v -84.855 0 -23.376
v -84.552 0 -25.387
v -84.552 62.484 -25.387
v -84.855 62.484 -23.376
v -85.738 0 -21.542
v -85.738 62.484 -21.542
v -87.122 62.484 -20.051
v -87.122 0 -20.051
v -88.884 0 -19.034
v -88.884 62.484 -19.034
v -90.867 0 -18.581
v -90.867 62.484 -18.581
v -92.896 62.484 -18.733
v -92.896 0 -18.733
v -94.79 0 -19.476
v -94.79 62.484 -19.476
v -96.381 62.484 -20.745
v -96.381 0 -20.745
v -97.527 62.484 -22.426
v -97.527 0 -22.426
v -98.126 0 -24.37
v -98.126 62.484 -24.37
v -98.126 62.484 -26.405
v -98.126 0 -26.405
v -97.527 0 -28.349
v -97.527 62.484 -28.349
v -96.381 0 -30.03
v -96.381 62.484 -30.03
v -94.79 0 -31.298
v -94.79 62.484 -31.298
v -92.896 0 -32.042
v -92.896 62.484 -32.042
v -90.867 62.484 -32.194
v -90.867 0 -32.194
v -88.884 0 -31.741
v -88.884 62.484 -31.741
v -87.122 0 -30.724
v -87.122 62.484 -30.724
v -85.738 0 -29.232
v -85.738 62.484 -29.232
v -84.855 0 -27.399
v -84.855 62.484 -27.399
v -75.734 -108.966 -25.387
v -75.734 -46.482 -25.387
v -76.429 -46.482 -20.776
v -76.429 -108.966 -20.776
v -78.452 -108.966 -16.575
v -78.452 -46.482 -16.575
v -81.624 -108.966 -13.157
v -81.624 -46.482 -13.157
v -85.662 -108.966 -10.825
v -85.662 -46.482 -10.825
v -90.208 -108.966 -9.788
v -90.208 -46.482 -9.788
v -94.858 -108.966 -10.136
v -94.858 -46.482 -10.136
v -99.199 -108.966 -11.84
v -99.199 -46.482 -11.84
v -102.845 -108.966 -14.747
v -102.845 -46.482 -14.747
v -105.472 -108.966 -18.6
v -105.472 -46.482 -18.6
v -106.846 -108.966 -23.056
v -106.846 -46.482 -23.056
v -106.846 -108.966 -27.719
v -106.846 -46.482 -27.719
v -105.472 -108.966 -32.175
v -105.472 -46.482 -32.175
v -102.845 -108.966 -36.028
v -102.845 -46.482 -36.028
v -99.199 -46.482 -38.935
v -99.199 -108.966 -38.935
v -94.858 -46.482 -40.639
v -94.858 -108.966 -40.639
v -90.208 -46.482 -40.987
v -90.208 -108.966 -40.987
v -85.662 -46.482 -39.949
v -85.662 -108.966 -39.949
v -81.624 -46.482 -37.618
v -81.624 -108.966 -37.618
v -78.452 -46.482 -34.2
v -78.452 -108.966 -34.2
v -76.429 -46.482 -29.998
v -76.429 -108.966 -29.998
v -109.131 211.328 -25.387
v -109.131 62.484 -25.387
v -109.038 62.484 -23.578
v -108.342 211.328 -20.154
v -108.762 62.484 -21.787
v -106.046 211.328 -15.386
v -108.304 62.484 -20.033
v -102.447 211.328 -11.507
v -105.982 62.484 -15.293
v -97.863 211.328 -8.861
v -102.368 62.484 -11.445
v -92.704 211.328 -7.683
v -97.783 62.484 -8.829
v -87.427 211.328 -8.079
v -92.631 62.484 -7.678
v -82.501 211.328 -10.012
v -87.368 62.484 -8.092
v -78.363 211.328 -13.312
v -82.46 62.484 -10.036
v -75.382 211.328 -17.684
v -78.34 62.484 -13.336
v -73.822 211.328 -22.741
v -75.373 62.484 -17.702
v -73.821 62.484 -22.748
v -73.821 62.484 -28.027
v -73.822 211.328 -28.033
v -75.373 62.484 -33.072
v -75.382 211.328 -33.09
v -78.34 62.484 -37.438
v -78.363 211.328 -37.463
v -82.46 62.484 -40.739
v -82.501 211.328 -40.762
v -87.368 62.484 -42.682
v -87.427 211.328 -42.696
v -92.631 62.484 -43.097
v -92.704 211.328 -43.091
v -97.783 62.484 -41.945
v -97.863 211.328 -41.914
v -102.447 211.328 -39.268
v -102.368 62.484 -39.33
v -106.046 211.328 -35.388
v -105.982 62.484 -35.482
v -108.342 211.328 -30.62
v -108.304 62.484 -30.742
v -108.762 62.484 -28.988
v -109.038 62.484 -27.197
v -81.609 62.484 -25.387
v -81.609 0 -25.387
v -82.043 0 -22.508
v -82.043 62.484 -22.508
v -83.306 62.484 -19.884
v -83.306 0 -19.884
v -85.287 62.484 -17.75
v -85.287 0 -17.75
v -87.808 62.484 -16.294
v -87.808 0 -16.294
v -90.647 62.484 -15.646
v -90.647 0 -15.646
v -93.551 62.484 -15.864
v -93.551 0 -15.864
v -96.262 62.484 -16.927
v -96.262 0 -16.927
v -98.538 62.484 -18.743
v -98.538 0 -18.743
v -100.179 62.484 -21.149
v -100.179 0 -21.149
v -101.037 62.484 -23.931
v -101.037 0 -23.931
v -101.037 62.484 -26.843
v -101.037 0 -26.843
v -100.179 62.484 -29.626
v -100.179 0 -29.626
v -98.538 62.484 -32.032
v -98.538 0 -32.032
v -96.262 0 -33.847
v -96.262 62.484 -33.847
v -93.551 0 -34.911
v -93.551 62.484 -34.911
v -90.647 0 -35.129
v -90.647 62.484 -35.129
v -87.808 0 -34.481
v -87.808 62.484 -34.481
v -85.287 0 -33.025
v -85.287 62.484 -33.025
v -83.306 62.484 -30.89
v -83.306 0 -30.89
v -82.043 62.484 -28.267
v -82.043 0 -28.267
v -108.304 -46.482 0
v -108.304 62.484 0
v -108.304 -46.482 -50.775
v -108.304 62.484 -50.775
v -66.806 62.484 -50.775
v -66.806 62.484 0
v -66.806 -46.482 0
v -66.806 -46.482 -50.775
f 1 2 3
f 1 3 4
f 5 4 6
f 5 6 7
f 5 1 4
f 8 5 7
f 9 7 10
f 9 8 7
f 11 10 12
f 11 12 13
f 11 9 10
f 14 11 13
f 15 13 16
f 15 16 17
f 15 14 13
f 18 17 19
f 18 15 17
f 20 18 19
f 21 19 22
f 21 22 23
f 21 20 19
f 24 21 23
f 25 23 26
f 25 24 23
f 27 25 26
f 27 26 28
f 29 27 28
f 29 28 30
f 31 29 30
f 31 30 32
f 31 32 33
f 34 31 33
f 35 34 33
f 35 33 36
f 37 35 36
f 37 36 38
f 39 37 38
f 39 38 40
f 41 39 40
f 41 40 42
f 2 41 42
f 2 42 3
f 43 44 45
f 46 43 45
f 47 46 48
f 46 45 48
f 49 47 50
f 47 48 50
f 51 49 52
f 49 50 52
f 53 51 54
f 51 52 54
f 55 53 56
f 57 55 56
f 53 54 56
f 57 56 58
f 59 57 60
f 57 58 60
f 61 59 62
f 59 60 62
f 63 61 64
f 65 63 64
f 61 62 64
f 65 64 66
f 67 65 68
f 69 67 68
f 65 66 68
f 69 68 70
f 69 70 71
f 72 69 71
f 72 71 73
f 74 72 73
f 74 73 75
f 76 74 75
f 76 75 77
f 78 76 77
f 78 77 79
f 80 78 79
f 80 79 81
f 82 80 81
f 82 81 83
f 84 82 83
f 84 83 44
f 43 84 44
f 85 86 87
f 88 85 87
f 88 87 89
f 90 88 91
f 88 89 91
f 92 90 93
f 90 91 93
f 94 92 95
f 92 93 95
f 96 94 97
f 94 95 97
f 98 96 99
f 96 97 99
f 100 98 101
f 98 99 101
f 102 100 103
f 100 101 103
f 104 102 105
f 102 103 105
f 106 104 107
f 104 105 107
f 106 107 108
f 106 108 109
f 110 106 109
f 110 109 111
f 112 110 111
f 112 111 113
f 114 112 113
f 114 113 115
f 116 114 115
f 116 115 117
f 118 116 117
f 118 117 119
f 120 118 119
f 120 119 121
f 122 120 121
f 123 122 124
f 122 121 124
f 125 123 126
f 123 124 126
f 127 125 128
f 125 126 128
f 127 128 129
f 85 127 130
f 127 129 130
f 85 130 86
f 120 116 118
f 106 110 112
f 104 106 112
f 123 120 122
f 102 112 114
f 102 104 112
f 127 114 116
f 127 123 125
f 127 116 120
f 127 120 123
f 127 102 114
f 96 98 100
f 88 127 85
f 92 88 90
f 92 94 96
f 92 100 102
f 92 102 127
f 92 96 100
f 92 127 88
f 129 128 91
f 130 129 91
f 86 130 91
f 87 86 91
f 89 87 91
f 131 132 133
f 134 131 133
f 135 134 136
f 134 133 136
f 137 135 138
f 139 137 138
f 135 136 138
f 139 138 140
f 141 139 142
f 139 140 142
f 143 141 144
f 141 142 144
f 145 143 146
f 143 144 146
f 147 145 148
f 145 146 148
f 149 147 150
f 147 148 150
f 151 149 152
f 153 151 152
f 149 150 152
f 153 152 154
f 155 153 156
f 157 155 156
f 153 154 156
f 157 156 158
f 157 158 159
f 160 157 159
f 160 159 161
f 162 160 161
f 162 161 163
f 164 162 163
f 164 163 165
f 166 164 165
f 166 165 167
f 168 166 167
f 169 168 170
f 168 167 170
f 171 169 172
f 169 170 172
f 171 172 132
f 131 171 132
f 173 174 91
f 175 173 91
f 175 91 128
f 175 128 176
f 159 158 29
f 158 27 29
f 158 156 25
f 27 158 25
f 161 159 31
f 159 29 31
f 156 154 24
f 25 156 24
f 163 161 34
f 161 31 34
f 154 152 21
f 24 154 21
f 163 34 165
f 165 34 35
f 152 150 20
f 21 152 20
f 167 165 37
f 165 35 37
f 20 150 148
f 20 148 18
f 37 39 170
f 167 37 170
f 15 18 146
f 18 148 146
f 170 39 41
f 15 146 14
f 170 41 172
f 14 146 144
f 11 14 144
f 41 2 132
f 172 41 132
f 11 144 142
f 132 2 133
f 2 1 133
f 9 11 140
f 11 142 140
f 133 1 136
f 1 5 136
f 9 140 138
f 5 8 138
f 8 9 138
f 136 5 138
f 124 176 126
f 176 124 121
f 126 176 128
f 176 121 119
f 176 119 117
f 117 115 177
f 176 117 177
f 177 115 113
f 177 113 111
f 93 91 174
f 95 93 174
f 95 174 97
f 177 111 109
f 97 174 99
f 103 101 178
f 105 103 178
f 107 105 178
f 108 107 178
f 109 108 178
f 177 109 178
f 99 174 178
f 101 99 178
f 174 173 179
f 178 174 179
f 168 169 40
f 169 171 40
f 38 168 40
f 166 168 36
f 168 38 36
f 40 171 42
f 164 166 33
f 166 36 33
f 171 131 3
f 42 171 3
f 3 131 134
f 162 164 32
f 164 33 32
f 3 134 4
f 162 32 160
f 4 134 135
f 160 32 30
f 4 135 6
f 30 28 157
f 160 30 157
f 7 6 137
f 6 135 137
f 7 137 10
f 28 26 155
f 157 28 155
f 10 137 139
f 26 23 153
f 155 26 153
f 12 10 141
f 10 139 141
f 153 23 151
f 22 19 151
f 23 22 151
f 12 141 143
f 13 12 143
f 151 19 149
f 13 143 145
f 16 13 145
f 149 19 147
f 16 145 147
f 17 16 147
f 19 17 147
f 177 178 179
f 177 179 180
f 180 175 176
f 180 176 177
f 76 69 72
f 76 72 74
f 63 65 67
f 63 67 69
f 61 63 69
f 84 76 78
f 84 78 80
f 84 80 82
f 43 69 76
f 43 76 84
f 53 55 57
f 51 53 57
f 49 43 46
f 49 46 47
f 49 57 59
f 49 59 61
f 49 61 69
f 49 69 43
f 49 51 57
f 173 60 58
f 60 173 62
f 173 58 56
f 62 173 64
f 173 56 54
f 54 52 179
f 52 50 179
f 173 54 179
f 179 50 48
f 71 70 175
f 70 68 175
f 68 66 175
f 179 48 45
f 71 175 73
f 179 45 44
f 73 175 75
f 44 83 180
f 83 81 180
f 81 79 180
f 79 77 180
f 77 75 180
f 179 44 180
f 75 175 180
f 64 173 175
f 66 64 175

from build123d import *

# Parameters (mm, degrees)
F0_W       = 41.4983332157
F0_H       = 50.7746972144
F0_R       = 9.7686704189
F1_DEPTH   = 62.484
F2_R       = 15.6433873562
F1_FACE1_W = 41.4983332157
F1_FACE1_H = 50.7746972144
F1_FACE1_R = 9.7686704189
F3_DEPTH   = 108.966
F4_R       = 17.7535536274
F5_DEPTH   = 148.844
F6_R       = 6.8253458282
F7_DEPTH   = 248.92


with BuildPart() as f1:
    # F0 (on Front) → F1 (new body)
    with BuildSketch(Plane.XZ):
        with Locations((-87.555155158, -25.3873486072)):
            Rectangle(F0_W, F0_H)
        with Locations((-91.3773775101, -25.3873486072)):
            Circle(F0_R, mode=Mode.SUBTRACT)
    extrude(amount=-F1_DEPTH)

    # F2 (on face) + F1_face1 (on face) → F3 (join)
    with BuildSketch(Plane.XZ):
        with Locations((-91.3773775101, -25.3873486072)):
            Circle(F2_R)
    with BuildSketch(Plane(origin=(-86.9211204596, 62.484, -25.3873486072), x_dir=(1, 0, 0), z_dir=(0, 1, 0))):
        with Locations((-0.6340346985, 0)):
            Rectangle(F1_FACE1_W, F1_FACE1_H)
        with Locations((-4.4562570505, 0)):
            Circle(F1_FACE1_R, mode=Mode.SUBTRACT)
    extrude(amount=F3_DEPTH, dir=(0, -1, 0))

    # F4 (on face) → F5 (join)
    with BuildSketch(Plane(origin=(0, 62.484, 0), x_dir=(-1, 0, 0), z_dir=(0, 1, 0))):
        with Locations((91.3773775101, -25.3873486072)):
            Circle(F4_R)
    extrude(amount=F5_DEPTH)

    # F6 (on face) → F7 (join)
    with BuildSketch(Plane.XZ.offset(108.966)):
        with Locations((-91.3773775101, -25.3873486072)):
            Circle(F6_R)
    extrude(amount=-F7_DEPTH)


solid = f1.part
